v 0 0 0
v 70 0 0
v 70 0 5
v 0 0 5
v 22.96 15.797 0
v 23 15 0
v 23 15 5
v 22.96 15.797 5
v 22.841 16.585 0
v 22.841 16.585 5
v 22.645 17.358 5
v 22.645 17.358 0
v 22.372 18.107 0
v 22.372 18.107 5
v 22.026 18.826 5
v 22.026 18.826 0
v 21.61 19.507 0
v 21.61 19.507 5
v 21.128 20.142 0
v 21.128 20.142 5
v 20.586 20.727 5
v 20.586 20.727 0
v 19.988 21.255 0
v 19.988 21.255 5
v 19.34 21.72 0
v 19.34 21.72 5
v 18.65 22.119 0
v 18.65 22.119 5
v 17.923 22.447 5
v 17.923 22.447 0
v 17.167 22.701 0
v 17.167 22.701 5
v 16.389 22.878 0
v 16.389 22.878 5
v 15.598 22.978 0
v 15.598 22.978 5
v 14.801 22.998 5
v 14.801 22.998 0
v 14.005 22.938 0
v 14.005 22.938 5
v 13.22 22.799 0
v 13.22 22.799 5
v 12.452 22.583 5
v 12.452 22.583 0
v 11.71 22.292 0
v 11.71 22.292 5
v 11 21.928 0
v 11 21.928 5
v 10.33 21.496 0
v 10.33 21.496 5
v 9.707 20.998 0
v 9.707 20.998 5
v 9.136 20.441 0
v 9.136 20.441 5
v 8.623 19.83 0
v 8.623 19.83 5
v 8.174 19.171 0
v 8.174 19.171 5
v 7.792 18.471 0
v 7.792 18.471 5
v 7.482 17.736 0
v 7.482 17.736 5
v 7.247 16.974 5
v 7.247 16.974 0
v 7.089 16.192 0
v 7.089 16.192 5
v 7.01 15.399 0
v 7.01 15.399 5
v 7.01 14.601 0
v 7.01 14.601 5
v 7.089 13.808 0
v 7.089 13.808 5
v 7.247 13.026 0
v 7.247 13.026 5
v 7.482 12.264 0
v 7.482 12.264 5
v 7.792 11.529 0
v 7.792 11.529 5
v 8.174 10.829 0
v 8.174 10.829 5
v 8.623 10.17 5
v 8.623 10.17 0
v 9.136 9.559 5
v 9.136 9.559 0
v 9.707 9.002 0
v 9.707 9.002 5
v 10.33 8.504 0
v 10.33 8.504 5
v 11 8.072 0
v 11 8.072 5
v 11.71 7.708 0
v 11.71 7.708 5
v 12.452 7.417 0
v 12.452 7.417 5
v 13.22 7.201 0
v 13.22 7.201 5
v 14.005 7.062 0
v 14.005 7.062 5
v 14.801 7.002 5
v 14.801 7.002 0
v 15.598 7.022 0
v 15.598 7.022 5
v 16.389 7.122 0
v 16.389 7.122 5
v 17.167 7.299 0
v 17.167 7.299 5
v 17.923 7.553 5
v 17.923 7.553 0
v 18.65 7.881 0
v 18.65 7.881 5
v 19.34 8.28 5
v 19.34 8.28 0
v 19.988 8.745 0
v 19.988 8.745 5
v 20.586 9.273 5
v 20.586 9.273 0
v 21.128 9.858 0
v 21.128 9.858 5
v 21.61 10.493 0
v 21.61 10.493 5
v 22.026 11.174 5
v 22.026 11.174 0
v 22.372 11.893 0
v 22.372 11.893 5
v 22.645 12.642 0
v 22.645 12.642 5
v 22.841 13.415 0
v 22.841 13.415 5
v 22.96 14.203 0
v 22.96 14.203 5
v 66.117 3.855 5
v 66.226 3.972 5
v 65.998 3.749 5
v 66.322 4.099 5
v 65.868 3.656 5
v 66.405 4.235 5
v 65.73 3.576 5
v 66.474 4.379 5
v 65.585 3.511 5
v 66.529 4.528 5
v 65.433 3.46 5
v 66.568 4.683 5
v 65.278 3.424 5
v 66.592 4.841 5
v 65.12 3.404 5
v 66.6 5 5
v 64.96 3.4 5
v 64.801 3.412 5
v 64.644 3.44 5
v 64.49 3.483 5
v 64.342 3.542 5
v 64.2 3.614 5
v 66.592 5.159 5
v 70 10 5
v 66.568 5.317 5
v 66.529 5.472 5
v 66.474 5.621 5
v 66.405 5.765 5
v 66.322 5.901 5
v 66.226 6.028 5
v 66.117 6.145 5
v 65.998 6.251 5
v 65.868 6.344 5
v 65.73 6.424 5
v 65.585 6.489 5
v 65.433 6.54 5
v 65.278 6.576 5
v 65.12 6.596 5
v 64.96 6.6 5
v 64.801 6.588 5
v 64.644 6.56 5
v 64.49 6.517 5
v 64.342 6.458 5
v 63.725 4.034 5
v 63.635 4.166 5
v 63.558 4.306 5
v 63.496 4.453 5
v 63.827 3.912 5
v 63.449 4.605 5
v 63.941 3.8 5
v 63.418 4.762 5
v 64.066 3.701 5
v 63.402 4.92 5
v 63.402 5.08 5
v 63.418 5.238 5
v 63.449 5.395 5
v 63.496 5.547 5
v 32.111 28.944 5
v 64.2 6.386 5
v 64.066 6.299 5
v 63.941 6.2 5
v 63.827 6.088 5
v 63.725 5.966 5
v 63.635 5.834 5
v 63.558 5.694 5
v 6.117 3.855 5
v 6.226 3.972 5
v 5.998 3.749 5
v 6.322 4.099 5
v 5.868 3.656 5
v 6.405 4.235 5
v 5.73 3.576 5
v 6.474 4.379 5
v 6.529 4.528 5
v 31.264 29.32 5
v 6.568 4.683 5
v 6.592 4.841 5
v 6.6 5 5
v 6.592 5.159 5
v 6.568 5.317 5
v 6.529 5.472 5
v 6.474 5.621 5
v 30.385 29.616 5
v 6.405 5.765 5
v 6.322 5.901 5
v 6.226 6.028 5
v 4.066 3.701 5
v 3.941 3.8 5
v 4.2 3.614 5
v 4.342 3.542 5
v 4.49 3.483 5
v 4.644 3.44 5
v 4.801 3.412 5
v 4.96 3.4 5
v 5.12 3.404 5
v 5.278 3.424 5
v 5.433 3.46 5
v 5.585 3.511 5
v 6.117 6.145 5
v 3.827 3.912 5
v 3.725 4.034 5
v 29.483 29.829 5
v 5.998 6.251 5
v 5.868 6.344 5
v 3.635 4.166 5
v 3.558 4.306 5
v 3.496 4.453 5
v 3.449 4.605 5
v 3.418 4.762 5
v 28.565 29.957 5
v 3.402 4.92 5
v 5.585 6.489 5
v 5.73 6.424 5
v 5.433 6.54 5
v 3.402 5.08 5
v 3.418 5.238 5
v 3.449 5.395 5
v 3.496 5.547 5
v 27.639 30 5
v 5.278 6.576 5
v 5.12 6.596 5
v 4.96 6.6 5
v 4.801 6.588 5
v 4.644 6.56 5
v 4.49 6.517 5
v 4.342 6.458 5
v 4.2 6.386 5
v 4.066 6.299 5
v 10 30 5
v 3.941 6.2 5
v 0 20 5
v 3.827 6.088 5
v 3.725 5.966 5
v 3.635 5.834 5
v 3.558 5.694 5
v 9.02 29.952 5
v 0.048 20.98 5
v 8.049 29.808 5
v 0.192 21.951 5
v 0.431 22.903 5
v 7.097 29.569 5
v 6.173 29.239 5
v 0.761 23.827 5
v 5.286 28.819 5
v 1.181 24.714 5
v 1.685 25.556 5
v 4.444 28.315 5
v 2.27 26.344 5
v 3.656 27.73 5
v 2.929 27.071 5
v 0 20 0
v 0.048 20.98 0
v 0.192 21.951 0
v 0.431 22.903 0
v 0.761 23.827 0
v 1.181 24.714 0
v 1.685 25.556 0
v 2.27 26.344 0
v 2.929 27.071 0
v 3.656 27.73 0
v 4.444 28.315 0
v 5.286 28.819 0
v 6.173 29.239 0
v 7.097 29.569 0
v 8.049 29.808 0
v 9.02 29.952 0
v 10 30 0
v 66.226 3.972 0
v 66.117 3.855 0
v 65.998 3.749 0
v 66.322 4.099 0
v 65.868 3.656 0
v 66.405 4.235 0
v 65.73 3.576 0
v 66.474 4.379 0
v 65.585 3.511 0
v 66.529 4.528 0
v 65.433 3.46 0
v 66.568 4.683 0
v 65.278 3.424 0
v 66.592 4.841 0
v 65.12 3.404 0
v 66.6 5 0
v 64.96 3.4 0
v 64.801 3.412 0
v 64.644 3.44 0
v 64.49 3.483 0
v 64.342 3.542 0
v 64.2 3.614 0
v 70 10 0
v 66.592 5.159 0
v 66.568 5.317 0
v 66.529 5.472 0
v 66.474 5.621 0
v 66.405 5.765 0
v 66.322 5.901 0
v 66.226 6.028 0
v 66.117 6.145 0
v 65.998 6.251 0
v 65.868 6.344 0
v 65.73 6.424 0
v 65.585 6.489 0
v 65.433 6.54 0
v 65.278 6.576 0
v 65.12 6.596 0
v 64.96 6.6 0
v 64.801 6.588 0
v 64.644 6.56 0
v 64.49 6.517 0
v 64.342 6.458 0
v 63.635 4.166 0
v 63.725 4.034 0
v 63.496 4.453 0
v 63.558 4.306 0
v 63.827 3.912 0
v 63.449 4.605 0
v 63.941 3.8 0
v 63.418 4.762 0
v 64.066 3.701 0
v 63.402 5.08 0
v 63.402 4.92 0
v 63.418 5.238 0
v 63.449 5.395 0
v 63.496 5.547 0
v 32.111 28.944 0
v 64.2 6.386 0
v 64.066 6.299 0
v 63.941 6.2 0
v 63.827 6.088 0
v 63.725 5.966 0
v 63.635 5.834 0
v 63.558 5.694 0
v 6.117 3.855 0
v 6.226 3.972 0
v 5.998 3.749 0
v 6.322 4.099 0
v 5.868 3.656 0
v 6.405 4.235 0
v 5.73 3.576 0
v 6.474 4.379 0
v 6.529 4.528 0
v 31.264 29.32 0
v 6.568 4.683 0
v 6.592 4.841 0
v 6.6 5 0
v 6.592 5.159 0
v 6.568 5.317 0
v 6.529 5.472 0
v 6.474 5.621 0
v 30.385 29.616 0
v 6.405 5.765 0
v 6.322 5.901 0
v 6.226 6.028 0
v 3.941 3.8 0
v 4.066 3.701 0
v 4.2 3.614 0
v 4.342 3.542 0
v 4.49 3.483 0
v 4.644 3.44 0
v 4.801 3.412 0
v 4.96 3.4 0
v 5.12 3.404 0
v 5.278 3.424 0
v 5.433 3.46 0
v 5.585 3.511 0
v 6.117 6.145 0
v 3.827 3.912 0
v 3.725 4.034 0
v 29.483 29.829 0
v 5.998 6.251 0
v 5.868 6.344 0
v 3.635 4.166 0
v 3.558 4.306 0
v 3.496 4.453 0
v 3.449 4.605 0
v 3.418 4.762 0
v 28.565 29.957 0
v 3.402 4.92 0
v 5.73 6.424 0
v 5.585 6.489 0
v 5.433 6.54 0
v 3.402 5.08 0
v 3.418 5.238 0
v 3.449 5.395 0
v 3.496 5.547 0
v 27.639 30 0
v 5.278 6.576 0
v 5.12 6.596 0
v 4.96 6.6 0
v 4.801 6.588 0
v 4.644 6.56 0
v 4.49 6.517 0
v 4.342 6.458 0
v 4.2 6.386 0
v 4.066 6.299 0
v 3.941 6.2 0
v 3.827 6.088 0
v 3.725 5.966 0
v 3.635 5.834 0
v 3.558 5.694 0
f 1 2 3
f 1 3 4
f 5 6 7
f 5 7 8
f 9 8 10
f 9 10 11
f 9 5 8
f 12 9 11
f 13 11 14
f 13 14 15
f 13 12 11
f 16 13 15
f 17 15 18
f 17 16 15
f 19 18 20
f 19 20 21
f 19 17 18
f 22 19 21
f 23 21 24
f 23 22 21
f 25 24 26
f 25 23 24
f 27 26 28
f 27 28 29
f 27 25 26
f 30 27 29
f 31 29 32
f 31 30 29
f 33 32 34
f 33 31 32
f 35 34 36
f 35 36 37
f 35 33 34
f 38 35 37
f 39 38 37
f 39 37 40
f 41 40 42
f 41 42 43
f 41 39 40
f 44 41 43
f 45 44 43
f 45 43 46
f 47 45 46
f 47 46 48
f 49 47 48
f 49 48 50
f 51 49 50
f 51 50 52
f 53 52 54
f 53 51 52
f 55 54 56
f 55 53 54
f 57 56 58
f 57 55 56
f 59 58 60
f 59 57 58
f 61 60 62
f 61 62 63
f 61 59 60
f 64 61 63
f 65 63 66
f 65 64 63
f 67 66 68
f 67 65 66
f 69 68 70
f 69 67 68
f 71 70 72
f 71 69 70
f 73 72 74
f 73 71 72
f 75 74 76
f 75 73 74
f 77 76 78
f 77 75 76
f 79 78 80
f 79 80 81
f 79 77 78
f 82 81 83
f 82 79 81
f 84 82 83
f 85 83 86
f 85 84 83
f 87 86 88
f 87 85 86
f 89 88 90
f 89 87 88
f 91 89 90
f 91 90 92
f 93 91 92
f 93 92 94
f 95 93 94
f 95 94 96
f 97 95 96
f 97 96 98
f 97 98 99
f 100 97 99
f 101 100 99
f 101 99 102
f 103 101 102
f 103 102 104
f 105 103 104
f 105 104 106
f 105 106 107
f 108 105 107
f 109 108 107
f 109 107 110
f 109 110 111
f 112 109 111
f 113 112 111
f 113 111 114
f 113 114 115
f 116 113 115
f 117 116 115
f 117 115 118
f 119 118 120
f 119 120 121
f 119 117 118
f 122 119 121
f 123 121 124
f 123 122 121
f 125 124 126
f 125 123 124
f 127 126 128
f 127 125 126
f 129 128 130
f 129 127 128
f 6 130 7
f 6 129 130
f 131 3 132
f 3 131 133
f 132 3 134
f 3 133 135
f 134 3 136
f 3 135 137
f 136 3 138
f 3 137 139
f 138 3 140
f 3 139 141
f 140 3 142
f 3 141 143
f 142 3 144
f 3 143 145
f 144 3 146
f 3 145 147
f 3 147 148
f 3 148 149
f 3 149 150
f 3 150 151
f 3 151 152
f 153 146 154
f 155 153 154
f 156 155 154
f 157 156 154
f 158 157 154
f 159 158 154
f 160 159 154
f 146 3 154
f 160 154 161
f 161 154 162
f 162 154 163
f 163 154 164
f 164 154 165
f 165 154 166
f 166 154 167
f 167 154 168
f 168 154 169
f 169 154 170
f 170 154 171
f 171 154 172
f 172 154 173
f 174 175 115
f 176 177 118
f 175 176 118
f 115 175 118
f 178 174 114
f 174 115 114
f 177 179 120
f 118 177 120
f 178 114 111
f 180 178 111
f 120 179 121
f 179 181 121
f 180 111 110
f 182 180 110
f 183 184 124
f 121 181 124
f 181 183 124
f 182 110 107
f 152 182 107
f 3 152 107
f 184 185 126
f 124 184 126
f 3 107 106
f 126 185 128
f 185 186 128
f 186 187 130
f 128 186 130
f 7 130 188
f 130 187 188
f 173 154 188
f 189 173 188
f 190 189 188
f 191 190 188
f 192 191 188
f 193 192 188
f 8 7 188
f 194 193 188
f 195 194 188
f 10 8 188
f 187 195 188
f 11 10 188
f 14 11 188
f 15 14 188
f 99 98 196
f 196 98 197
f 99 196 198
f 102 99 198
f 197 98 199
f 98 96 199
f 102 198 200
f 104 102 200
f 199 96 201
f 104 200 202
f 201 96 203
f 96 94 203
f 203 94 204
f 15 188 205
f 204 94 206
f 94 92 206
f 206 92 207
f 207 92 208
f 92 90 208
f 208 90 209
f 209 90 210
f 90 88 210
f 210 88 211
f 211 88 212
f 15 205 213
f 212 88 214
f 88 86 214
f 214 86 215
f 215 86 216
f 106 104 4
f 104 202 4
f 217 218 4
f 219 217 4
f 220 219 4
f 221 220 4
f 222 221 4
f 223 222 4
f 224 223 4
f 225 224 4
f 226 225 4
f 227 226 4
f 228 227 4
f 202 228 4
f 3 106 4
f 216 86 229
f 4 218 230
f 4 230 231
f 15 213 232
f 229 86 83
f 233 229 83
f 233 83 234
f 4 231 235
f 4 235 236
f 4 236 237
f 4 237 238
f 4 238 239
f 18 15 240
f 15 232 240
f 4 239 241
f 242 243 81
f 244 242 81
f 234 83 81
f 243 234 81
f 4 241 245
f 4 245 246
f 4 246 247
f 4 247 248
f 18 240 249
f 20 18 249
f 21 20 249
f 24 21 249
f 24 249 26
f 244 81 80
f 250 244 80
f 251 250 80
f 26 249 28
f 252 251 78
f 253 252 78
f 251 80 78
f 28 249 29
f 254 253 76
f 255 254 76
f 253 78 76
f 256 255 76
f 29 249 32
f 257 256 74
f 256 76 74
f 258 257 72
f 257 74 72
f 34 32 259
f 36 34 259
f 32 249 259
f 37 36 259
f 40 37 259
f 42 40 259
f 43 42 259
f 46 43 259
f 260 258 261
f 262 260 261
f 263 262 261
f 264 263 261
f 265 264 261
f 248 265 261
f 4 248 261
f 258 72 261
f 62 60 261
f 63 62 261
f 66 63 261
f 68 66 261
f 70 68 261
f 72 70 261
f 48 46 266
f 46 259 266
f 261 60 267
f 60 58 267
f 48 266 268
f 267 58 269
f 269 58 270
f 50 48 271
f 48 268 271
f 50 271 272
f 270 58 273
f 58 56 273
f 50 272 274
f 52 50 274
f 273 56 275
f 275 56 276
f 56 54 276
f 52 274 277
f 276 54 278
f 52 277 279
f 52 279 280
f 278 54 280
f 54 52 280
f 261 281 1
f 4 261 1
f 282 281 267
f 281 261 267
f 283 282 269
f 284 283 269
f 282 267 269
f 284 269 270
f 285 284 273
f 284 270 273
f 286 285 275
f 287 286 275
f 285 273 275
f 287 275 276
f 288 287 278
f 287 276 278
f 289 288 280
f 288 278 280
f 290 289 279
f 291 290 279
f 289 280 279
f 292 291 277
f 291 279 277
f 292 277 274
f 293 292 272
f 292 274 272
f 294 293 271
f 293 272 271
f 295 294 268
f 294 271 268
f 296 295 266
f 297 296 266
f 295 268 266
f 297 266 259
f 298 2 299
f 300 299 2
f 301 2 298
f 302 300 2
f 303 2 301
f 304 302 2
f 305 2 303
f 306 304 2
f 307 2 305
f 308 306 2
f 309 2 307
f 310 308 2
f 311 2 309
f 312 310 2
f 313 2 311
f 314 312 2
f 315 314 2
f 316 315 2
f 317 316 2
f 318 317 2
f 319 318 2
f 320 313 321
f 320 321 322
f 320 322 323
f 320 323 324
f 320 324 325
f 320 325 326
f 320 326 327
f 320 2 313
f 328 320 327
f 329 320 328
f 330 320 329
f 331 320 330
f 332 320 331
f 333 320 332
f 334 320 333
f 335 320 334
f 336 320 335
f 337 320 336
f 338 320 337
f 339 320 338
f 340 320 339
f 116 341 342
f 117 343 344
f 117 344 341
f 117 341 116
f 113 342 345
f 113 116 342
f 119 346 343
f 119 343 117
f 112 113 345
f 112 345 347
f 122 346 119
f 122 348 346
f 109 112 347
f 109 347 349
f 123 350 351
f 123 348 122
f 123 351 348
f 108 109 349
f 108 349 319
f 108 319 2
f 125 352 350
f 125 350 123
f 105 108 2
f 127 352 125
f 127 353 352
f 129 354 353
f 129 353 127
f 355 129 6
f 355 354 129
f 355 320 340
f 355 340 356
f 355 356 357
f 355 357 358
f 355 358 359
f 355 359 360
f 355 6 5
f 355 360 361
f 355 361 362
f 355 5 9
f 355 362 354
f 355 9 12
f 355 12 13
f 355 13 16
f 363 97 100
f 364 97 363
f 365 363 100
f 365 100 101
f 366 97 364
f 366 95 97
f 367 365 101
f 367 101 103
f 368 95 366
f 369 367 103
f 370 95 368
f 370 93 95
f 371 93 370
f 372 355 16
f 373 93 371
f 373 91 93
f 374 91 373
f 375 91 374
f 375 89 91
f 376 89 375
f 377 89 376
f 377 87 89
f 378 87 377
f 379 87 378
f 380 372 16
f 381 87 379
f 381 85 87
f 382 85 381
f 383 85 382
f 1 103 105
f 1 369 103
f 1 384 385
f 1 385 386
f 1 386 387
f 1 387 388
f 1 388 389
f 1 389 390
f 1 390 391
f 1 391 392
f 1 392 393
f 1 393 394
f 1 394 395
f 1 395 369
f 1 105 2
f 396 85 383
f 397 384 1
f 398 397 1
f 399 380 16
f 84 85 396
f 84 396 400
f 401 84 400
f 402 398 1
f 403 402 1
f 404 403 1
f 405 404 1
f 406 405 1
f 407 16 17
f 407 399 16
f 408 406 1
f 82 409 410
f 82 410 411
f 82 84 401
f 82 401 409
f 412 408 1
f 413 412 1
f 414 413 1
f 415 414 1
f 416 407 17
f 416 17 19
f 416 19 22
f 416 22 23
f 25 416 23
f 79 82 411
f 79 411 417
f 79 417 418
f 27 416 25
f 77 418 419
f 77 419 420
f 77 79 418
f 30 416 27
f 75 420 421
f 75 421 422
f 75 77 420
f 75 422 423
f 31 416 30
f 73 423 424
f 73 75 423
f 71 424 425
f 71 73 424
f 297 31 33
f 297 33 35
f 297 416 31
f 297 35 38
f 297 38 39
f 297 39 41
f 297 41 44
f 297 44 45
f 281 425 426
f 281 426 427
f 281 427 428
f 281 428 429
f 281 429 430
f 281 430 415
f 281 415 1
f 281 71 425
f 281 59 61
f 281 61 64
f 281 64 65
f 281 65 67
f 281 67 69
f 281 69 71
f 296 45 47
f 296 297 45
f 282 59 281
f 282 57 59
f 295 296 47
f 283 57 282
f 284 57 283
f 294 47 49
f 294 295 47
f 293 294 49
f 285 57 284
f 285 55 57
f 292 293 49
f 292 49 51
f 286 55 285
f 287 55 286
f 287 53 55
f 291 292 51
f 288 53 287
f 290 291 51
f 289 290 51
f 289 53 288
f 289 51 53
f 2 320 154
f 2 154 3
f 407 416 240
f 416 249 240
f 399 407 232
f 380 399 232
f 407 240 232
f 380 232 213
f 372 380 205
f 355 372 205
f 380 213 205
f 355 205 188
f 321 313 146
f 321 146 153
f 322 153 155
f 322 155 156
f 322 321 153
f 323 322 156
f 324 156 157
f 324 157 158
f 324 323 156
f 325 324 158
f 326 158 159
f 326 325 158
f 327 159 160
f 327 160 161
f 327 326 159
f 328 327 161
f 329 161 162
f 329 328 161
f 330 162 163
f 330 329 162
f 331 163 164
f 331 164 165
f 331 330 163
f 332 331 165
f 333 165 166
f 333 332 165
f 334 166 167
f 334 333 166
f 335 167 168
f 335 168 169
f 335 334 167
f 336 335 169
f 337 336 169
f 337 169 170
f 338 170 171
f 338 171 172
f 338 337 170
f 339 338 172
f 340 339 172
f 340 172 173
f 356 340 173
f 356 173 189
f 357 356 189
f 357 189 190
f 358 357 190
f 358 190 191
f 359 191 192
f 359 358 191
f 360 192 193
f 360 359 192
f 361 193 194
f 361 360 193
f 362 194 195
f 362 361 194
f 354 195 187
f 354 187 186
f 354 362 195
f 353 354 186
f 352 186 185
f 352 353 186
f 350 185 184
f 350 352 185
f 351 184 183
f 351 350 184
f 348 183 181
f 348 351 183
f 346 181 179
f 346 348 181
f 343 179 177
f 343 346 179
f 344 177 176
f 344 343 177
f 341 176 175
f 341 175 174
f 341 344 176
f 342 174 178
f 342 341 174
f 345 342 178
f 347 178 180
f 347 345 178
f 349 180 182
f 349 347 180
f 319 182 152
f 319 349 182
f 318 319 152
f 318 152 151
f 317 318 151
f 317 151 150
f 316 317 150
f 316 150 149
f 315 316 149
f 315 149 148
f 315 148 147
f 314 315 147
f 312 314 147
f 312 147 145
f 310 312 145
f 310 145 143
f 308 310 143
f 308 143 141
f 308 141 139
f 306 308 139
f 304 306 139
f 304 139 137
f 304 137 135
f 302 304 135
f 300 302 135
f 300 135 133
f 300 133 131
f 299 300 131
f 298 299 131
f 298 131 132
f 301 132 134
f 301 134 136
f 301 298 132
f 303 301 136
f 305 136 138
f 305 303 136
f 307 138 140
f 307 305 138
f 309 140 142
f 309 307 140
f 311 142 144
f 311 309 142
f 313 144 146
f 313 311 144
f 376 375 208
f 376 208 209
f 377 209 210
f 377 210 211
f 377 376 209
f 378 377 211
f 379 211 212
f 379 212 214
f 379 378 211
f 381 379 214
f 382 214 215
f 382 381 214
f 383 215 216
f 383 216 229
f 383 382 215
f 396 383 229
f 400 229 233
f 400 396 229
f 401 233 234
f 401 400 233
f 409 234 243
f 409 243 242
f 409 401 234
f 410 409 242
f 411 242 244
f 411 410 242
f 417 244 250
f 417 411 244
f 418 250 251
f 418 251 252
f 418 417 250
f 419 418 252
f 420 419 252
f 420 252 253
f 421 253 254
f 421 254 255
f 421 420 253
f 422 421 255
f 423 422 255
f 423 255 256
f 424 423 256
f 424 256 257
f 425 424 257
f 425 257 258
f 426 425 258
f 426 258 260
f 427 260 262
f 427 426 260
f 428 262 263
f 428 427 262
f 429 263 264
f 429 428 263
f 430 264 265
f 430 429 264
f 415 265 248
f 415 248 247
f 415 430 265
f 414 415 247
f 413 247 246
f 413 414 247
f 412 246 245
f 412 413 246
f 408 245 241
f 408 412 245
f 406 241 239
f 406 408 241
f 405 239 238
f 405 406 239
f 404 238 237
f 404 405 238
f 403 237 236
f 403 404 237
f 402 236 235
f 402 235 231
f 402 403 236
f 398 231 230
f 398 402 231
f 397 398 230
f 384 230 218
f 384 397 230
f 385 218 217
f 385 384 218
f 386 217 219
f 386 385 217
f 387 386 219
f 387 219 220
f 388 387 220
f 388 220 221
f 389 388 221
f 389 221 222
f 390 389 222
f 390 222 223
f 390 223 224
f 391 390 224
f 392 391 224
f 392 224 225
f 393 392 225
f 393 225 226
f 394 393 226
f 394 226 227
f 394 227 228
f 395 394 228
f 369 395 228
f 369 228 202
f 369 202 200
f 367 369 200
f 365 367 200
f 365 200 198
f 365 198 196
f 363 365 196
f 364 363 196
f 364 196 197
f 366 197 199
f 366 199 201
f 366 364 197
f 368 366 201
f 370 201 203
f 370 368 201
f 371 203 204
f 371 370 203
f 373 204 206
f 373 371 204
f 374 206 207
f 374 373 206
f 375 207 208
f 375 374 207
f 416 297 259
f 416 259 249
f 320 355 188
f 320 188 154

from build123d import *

# Parameters (mm, degrees)
SKETCH_1_R      = 8
SKETCH_1_R_2    = 1.6
EXTRUDE_1_DEPTH = 5
FILLET_1_R      = 10


with BuildPart() as part:
    # ｽｹｯﾁ1 → ﾎﾞｽ - 押し出し1 (new body)
    with BuildSketch(Plane.XY):
        Polygon((0, 0), (0, 10), (0, 30), (30, 30), (70, 10), (70, 0), align=None)
        with Locations((15, 15)):
            Circle(SKETCH_1_R, mode=Mode.SUBTRACT)
        with Locations((5, 5)):
            Circle(SKETCH_1_R_2, mode=Mode.SUBTRACT)
        with Locations((65, 5)):
            Circle(SKETCH_1_R_2, mode=Mode.SUBTRACT)
    extrude(amount=EXTRUDE_1_DEPTH)

    # ﾌｨﾚｯﾄ1
    fillet_1_edges = [part.edges().sort_by_distance(p)[0] for p in [
        (0, 30, 2.5),
        (30, 30, 2.5),
    ]]
    fillet(fillet_1_edges, radius=FILLET_1_R)


solid = part.part
